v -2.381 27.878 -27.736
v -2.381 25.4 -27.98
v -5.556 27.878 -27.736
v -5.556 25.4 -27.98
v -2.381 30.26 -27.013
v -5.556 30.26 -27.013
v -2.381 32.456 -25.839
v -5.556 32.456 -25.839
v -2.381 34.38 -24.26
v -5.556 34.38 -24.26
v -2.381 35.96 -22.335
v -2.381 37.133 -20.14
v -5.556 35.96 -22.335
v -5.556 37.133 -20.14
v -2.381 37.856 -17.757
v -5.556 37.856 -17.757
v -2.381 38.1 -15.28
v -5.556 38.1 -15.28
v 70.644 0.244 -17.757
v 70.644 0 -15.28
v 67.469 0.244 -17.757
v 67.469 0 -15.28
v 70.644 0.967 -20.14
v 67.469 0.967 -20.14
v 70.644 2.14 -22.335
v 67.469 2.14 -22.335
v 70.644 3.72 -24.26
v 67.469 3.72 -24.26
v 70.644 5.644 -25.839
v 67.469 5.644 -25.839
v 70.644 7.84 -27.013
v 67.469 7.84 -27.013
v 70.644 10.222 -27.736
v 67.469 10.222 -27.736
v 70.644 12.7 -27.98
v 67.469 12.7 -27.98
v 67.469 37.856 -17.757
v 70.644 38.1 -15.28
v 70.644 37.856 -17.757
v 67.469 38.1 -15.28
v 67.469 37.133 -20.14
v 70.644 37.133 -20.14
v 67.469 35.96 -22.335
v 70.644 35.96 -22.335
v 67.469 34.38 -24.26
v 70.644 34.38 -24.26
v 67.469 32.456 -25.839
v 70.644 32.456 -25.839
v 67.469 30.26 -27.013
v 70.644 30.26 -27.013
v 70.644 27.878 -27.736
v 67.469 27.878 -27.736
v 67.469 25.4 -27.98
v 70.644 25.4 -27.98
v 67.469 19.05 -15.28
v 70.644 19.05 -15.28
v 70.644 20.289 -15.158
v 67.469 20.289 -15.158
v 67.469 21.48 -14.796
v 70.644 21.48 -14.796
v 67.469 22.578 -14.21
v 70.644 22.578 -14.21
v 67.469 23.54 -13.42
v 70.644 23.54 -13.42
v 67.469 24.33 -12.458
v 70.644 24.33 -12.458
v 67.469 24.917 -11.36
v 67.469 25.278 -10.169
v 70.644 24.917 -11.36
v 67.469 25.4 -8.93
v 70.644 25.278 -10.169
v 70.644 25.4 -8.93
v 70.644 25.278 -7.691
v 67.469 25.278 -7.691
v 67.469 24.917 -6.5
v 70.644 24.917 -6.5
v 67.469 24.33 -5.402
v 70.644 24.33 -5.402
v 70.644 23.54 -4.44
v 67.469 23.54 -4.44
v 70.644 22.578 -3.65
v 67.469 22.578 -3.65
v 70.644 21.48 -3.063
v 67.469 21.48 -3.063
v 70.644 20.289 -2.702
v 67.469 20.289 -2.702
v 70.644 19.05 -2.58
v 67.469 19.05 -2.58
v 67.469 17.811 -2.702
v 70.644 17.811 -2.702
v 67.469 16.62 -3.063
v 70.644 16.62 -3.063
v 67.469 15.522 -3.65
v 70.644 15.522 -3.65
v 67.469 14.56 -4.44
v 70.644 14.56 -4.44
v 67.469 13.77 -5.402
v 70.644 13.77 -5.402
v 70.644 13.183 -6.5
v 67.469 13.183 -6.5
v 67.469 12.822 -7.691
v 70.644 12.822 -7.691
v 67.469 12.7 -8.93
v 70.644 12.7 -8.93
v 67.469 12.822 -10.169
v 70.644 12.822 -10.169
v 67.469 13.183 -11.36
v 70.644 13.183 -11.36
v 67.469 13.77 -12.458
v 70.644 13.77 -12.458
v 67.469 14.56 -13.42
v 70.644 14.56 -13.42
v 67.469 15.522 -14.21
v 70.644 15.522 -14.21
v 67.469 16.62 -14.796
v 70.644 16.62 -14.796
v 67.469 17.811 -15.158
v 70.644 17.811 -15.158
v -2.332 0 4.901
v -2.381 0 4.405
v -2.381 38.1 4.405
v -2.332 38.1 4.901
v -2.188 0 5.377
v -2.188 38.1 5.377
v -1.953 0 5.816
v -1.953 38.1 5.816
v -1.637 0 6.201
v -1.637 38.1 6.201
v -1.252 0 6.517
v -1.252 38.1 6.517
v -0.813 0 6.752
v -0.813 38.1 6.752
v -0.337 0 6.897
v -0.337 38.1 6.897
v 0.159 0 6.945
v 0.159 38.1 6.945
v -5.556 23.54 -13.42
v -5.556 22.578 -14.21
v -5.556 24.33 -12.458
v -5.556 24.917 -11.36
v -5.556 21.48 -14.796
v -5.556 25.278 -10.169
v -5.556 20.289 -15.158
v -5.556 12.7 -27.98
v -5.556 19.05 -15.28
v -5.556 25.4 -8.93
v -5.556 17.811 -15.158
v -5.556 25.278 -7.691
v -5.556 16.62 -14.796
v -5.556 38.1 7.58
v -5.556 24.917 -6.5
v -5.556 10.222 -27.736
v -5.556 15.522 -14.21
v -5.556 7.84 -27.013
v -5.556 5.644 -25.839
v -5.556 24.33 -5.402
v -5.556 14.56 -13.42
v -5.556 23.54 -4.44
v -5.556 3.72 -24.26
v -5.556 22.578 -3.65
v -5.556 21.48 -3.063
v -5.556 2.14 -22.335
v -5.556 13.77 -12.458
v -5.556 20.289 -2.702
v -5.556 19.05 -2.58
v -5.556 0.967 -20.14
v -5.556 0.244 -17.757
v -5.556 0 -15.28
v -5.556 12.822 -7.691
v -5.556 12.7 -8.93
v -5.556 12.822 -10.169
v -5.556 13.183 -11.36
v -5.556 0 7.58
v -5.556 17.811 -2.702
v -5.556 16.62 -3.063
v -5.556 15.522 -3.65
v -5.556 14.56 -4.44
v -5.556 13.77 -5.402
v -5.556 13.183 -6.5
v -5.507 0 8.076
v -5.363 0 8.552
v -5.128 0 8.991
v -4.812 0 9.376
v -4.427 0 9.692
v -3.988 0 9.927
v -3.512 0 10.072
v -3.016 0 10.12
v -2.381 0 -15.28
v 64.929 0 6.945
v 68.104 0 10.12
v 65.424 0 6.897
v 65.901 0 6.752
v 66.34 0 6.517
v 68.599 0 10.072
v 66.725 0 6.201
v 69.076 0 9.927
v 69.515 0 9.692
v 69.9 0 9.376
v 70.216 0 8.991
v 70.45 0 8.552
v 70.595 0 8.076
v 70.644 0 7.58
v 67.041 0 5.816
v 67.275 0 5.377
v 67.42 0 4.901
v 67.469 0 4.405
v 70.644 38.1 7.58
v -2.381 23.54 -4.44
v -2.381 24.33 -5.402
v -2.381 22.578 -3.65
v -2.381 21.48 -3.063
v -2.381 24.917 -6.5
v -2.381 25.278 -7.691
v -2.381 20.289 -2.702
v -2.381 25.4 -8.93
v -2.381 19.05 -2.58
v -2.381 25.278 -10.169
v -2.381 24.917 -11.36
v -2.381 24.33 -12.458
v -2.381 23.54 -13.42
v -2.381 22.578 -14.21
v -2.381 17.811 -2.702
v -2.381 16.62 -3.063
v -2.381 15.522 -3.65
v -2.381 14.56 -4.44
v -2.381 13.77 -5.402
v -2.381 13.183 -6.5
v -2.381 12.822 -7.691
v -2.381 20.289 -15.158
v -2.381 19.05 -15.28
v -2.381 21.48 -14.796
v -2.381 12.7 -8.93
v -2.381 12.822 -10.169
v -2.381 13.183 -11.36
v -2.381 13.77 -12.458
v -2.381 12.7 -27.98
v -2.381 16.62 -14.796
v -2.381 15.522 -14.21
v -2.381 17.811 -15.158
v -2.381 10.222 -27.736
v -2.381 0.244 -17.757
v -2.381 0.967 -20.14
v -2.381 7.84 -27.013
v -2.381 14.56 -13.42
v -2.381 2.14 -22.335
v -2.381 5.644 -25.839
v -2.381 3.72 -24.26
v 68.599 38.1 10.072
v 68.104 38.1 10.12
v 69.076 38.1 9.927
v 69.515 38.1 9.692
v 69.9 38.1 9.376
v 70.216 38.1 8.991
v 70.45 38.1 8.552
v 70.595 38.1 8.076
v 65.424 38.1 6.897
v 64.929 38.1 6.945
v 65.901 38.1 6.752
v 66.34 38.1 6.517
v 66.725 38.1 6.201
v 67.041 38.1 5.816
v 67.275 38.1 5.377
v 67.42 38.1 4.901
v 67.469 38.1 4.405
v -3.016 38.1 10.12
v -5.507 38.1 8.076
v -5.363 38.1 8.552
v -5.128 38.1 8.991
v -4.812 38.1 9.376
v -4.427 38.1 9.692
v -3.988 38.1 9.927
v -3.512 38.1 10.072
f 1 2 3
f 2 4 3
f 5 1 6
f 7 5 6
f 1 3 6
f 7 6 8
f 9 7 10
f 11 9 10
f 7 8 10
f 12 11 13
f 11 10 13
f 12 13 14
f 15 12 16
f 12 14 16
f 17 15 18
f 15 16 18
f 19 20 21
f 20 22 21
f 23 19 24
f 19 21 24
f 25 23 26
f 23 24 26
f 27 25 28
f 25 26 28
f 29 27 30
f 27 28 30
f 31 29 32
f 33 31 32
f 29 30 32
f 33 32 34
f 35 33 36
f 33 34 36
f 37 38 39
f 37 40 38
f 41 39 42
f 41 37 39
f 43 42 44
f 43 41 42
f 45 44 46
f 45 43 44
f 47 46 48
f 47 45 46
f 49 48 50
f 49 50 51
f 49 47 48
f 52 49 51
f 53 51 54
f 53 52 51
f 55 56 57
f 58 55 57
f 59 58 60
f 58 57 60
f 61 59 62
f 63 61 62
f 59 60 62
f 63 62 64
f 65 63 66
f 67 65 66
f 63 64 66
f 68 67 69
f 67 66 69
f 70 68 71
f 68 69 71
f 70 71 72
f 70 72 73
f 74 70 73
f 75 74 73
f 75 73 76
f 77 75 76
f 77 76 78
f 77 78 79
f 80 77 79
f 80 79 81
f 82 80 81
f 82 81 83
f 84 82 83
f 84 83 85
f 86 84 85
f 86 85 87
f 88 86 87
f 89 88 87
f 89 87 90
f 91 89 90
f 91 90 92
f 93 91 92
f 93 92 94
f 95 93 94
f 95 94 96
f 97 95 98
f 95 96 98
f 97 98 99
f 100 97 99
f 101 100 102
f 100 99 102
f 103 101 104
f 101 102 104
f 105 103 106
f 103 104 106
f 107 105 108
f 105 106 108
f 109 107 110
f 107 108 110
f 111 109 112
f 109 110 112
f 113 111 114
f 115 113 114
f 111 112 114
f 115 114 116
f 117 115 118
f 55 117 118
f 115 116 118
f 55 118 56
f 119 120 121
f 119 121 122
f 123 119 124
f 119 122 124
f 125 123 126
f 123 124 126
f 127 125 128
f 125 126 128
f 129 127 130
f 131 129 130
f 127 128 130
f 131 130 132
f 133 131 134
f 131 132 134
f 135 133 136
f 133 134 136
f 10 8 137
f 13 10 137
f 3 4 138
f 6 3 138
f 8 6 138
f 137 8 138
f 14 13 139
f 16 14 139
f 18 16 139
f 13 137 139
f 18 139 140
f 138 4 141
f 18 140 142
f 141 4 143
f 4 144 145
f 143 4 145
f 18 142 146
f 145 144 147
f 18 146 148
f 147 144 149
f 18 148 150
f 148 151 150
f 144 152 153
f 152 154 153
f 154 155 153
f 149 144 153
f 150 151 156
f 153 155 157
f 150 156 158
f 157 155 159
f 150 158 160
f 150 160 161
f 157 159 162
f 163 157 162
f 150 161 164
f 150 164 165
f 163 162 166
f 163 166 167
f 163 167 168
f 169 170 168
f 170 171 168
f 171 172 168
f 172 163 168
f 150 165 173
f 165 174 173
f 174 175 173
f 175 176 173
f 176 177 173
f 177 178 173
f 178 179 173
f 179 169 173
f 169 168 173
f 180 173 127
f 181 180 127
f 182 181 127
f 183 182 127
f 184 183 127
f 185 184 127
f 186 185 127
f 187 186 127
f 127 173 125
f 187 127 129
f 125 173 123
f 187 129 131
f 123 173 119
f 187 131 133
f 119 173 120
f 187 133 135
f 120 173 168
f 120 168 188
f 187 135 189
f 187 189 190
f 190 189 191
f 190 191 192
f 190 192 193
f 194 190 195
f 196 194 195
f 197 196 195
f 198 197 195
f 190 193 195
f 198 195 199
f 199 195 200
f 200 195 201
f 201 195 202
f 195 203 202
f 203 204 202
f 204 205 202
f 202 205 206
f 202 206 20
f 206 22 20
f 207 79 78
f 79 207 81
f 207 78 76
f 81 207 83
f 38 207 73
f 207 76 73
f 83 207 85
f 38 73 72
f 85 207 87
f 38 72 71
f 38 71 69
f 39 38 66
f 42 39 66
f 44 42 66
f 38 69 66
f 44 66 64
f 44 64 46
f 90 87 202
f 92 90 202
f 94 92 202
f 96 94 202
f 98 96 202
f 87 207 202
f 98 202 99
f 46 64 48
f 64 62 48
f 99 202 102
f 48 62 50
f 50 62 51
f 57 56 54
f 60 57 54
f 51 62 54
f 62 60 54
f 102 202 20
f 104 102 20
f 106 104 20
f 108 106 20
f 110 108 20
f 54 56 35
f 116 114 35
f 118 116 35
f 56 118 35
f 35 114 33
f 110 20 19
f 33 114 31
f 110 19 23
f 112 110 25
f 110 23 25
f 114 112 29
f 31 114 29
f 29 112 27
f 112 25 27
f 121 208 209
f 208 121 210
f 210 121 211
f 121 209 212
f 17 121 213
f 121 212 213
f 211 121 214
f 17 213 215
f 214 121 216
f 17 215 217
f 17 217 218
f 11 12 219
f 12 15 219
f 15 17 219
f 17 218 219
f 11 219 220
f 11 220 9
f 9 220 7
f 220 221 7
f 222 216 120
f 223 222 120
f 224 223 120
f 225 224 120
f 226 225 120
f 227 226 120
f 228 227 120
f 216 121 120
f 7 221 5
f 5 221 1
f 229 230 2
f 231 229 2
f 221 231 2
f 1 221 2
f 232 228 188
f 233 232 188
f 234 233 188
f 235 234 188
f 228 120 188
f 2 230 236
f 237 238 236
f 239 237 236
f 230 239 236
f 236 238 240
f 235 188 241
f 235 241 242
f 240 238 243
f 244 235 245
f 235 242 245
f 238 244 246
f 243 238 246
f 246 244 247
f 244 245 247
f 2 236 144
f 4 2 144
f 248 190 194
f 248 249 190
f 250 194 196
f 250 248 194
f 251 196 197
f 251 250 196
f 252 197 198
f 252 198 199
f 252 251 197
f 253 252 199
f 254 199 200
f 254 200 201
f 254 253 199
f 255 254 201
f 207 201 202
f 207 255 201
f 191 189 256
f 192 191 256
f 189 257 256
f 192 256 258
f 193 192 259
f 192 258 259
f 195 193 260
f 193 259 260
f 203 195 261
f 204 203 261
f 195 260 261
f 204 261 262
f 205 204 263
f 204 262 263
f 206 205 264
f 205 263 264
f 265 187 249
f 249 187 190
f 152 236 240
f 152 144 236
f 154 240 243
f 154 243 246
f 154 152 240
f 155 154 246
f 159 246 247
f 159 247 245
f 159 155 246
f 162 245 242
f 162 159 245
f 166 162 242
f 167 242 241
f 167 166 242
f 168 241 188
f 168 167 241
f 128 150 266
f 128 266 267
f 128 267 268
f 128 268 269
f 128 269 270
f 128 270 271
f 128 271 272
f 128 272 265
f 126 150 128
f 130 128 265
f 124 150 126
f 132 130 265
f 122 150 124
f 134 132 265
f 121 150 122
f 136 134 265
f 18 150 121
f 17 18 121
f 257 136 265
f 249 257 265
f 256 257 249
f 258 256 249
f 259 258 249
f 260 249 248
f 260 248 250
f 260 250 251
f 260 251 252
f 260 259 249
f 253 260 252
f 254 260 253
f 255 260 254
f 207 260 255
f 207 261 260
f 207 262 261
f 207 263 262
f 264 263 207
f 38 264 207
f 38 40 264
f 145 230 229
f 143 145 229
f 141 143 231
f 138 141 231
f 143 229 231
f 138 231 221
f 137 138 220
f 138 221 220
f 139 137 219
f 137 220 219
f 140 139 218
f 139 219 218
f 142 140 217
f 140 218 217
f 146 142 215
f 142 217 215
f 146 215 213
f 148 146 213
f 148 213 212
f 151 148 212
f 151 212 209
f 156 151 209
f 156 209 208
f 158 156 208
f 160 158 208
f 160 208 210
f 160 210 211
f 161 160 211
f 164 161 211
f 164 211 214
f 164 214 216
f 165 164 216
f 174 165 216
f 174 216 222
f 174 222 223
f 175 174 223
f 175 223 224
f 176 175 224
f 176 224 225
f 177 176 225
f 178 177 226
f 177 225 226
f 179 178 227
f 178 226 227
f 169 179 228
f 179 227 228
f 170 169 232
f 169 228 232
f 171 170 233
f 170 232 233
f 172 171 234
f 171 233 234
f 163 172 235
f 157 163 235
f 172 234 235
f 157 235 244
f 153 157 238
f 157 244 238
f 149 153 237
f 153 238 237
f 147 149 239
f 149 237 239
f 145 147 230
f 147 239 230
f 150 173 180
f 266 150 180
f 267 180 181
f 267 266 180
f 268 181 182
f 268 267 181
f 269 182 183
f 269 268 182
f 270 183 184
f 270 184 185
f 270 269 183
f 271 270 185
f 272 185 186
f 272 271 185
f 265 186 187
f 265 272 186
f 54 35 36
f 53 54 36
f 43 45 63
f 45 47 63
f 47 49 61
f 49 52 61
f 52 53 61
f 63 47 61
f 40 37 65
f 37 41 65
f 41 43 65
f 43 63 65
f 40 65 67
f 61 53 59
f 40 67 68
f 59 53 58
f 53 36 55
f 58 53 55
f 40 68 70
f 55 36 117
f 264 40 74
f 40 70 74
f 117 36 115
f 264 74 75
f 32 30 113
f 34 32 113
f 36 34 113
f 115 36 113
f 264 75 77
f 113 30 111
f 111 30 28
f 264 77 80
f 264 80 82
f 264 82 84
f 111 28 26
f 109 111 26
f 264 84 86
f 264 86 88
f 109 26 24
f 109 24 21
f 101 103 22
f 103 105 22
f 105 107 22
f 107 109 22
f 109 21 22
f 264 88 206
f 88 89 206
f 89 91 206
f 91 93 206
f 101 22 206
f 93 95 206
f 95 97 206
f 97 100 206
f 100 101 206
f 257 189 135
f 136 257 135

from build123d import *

# Parameters (mm, degrees)
BOSS_EXTRUDE1_DEPTH = 38.1
SKETCH4_R           = 6.35
CUT_EXTRUDE1_DEPTH  = 77.2
FILLET1_R           = 12.7
FILLET2_R           = 2.54


with BuildPart() as part:
    # Sketch1 → Boss-Extrude1 (new body)
    with BuildSketch(Plane(origin=(0, 0, 0), x_dir=(1, 0, 0), z_dir=(0, 1, 0))):
        Polygon((-5.55625, 27.9796875), (-5.55625, -10.1203125), (70.64375, -10.1203125), (70.64375, 27.9796875), (67.46875, 27.9796875), (67.46875, -6.9453125), (-2.38125, -6.9453125), (-2.38125, 27.9796875), align=None)
    extrude(amount=BOSS_EXTRUDE1_DEPTH)

    # Sketch4 → Cut-Extrude1 (cut, through all)
    with BuildSketch(Plane(origin=(70.64375, 0, 0), x_dir=(0, 0, -1), z_dir=(1, 0, 0))):
        with Locations((8.9296875, 19.05)):
            Circle(SKETCH4_R)
    extrude(amount=-CUT_EXTRUDE1_DEPTH, mode=Mode.SUBTRACT)

    # Fillet1
    fillet1_edges = [part.edges().sort_by_distance(p)[0] for p in [
        (-3.96875, 0, -27.9796875),
        (69.05625, 38.1, -27.9796875),
        (-3.96875, 38.1, -27.9796875),
        (69.05625, 0, -27.9796875),
    ]]
    fillet(fillet1_edges, radius=FILLET1_R)

    # Fillet2
    fillet2_edges = [part.edges().sort_by_distance(p)[0] for p in [
        (-2.38125, 19.05, 6.9453125),
        (67.46875, 19.05, 6.9453125),
        (70.64375, 19.05, 10.1203125),
        (-5.55625, 19.05, 10.1203125),
    ]]
    fillet(fillet2_edges, radius=FILLET2_R)


solid = part.part
